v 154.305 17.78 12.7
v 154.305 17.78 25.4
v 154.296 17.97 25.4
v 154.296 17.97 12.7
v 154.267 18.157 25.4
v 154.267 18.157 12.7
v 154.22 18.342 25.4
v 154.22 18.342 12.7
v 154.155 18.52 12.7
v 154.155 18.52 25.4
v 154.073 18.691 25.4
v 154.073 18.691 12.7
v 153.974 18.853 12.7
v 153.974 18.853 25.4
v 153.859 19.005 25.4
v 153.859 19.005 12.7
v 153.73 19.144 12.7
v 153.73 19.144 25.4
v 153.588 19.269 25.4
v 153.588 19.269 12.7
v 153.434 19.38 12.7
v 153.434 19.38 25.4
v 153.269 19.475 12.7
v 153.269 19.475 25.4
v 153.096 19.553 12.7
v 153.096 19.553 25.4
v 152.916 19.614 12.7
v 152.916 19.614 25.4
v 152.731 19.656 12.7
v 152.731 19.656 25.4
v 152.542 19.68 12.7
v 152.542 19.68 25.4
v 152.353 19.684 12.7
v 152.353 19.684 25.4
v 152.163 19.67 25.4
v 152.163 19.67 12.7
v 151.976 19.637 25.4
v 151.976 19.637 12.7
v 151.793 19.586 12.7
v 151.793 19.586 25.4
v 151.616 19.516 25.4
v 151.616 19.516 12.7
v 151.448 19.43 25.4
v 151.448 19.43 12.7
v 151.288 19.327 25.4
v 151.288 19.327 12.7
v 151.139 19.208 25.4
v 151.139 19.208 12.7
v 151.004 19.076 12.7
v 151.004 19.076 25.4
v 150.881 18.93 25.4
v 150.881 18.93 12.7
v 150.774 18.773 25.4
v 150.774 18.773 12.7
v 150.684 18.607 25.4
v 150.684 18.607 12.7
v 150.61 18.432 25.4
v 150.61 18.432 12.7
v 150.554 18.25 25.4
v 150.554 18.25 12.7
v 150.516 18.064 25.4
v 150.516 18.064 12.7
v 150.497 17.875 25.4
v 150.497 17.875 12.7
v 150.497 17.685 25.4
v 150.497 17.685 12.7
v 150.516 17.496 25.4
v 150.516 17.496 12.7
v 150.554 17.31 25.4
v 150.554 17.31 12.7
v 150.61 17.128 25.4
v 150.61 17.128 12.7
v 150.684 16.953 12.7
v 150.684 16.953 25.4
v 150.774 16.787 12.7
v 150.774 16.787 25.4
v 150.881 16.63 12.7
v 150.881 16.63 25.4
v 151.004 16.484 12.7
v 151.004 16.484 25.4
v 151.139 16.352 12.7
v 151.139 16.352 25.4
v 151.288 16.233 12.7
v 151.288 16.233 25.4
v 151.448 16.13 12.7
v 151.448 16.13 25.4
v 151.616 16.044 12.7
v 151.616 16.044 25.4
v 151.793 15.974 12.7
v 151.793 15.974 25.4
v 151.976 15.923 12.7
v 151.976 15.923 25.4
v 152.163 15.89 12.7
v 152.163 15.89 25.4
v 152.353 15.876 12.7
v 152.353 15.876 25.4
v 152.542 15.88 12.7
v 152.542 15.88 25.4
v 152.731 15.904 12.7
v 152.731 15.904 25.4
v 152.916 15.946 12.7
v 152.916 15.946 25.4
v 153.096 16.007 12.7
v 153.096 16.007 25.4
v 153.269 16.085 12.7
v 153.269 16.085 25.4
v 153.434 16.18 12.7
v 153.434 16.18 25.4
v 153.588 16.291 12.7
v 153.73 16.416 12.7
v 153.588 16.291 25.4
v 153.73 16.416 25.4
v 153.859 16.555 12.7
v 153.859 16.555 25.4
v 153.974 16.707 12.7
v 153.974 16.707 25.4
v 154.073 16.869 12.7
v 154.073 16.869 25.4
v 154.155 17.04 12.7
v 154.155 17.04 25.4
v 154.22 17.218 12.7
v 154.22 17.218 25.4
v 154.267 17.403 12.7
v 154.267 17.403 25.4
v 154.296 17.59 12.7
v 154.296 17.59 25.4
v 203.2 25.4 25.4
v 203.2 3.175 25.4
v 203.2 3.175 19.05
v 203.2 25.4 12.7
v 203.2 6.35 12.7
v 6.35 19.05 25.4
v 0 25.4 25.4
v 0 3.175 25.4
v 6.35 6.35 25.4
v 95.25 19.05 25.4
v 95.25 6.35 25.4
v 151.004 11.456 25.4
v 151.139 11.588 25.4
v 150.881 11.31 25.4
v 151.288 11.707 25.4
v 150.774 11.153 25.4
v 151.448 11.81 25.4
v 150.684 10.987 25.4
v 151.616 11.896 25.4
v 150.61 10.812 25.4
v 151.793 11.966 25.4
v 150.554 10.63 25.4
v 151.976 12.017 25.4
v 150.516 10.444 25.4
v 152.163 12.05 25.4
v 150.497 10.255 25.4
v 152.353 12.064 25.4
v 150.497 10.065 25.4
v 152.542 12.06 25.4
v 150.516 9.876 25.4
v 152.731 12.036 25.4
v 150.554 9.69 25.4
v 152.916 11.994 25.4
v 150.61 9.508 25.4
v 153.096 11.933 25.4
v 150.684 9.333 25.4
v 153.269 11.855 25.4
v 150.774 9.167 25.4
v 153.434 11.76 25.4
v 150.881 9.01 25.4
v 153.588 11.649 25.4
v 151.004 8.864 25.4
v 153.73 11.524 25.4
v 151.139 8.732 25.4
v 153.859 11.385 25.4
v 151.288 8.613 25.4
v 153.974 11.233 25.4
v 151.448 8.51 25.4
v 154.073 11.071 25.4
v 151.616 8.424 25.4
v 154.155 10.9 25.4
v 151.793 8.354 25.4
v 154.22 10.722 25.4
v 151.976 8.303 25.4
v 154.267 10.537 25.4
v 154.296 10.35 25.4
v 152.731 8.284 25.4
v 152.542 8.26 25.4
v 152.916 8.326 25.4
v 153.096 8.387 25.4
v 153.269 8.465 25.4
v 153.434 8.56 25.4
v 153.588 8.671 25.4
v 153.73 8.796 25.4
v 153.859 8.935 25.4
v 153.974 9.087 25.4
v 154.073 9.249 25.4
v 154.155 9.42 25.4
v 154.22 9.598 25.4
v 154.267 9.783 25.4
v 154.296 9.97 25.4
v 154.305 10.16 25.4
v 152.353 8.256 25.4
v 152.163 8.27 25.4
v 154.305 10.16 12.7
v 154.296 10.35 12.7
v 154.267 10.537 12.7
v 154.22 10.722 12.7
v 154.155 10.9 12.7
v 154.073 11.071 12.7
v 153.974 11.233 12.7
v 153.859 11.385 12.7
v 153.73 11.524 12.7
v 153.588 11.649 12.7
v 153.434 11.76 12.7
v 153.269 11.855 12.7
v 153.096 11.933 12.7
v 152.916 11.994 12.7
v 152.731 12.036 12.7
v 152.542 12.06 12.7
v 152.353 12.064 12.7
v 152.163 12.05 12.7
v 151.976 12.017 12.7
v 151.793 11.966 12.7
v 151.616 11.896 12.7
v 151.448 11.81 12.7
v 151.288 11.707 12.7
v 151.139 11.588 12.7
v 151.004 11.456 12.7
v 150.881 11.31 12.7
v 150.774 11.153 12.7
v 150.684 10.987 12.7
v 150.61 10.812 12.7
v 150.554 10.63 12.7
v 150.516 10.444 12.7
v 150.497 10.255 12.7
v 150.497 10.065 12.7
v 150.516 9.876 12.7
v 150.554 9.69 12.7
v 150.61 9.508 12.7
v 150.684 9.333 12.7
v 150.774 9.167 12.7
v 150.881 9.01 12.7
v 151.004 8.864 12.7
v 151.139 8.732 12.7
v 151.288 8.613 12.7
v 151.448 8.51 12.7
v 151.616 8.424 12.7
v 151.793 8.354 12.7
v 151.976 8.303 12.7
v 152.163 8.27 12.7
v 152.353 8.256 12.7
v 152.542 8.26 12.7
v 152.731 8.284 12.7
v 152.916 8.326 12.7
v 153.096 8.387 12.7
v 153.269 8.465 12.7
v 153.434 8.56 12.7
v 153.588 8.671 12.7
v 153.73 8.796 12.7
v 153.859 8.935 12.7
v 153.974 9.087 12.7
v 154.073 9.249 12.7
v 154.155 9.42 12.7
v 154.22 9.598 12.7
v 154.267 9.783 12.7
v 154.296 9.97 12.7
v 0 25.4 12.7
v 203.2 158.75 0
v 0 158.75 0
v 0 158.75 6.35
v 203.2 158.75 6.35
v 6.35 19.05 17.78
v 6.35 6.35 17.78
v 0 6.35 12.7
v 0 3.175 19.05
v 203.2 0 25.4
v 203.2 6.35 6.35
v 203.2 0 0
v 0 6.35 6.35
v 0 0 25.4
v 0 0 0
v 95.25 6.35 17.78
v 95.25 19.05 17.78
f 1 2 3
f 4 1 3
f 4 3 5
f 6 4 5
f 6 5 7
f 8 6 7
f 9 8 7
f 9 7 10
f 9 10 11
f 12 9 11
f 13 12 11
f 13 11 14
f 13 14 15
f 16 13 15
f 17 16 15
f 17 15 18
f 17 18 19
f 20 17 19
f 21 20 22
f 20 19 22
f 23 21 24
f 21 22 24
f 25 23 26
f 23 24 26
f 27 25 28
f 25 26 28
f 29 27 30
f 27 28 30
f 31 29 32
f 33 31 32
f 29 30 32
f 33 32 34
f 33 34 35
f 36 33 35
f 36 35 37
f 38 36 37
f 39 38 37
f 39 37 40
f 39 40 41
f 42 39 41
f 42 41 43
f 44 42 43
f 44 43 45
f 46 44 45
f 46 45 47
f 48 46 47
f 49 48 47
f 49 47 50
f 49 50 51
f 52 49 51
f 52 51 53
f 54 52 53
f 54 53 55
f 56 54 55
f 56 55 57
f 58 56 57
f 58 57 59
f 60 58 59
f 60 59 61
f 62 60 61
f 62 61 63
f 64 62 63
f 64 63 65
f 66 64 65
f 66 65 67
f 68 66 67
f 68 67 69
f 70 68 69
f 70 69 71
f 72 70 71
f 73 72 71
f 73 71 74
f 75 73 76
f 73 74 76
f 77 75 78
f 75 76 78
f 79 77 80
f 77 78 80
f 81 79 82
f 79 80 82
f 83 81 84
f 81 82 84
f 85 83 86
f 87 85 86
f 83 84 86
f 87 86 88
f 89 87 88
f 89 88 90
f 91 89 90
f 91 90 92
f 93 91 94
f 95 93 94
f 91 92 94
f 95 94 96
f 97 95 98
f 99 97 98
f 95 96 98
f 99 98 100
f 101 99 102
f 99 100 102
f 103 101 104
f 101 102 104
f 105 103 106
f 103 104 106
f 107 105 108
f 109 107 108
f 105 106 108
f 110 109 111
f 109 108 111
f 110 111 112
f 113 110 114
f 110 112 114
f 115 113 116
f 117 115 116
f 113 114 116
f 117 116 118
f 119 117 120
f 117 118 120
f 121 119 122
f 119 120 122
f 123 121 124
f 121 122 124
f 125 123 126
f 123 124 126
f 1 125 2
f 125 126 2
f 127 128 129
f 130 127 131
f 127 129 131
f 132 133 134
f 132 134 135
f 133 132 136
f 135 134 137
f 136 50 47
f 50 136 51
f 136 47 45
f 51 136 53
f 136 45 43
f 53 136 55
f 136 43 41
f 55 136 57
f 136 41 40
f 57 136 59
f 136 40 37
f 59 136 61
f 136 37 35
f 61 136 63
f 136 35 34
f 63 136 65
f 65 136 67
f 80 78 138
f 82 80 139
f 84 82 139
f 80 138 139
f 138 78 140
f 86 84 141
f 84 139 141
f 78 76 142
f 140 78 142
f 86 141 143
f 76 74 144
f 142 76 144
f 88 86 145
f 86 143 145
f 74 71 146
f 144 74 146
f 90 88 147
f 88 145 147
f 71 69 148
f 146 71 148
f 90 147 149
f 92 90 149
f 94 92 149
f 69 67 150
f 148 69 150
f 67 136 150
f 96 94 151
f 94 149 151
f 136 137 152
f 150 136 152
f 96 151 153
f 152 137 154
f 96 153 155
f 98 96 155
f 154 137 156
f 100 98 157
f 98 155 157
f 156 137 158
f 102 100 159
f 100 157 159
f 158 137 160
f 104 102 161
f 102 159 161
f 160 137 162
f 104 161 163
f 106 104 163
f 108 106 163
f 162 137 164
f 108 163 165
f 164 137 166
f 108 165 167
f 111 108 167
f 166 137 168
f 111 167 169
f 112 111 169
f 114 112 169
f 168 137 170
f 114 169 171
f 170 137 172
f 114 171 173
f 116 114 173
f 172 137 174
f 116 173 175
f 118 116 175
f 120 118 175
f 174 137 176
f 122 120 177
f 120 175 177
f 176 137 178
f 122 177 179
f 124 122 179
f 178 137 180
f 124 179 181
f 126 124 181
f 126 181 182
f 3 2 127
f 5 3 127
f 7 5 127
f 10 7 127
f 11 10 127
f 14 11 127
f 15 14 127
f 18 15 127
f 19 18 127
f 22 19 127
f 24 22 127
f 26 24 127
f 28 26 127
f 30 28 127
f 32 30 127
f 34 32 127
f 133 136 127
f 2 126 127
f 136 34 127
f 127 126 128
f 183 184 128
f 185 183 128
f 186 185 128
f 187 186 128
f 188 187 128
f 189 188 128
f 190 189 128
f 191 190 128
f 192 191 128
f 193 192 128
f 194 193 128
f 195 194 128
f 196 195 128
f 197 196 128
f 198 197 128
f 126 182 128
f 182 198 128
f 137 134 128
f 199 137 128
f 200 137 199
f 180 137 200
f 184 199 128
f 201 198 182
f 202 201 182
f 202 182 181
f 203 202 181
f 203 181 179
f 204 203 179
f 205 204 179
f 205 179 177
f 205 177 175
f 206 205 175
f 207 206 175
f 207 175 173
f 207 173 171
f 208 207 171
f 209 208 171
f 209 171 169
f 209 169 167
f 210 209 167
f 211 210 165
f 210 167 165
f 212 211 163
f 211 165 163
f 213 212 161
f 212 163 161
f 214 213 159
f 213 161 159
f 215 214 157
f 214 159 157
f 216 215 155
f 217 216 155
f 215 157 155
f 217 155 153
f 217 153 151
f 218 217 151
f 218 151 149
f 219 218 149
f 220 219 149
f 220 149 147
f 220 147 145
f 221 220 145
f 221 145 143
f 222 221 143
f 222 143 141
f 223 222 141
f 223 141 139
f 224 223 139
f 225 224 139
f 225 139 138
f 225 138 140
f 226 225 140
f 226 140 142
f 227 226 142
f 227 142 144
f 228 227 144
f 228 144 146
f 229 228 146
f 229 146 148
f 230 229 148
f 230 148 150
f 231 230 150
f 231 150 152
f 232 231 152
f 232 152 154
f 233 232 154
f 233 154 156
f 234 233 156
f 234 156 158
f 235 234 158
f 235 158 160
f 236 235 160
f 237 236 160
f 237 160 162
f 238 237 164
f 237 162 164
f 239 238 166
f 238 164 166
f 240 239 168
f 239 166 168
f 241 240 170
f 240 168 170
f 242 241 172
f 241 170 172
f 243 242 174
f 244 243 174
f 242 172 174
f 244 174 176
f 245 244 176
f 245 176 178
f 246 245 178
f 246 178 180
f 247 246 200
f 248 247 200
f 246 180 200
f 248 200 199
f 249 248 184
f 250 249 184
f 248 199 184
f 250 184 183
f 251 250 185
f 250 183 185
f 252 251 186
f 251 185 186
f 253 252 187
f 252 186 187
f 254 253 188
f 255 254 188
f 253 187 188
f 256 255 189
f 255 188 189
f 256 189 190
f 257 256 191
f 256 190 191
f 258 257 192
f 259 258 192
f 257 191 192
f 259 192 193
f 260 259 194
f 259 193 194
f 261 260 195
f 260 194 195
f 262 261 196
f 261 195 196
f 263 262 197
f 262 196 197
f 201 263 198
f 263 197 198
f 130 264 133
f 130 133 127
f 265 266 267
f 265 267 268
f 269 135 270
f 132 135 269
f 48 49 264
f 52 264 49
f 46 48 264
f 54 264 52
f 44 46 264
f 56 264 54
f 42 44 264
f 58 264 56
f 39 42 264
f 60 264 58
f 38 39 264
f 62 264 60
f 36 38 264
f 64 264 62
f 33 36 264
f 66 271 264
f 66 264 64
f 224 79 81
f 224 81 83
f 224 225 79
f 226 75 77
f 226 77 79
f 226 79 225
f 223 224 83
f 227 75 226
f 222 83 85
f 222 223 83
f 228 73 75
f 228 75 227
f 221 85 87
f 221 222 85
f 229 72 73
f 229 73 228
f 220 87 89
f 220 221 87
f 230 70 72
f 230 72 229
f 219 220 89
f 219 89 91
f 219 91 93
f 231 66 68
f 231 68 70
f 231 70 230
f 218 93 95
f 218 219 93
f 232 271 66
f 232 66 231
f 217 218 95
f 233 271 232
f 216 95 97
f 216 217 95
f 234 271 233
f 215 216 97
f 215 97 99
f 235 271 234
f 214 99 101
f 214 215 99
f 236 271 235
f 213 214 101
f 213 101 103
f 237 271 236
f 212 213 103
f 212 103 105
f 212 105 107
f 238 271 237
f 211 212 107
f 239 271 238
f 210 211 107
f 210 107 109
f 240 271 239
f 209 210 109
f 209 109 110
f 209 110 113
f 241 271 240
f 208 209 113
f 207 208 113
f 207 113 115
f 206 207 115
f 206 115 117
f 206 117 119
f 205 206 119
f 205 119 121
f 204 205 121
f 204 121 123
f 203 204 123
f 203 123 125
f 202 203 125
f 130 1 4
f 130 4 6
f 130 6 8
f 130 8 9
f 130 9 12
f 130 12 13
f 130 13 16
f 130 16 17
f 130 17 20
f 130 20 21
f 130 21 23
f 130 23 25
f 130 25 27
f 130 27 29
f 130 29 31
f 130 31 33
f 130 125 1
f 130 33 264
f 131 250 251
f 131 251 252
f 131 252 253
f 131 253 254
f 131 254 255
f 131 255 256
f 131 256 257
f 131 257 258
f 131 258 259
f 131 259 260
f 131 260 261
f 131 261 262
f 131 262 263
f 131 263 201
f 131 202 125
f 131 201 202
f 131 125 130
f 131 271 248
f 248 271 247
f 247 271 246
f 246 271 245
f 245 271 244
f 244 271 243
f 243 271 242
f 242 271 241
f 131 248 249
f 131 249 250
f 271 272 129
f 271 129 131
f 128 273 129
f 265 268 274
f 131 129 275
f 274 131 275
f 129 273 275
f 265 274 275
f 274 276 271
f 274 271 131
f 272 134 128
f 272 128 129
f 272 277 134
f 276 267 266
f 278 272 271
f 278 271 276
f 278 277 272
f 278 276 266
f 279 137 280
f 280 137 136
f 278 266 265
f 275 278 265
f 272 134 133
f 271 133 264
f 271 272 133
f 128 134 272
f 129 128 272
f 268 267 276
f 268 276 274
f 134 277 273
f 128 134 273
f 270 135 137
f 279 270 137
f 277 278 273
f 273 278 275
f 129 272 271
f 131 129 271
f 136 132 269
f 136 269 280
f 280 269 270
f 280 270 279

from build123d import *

# Parameters (mm, degrees)
SKETCH1_W              = 203.2
SKETCH1_H              = 158.75
BOSS_EXTRUDE1_DEPTH    = 6.35
SKETCH2_W              = 203.2
SKETCH2_H              = 6.35
BOSS_EXTRUDE2_DEPTH    = 19.05
SKETCH3_W              = 203.2
SKETCH3_H              = 12.7
BOSS_EXTRUDE3_DEPTH    = 19.05
SKETCH4_W              = 88.9
SKETCH4_H              = 12.7
CUT_EXTRUDE1_DEPTH     = 7.62
CUT_EXTRUDE2_REACH     = 261.108
SKETCH5_R              = 1.905
SPLIT1_SURFACE_1_BACK  = 260.108
SPLIT1_SURFACE_1_DEPTH = 520.216
SPLIT1_SURFACE_2_BACK  = 260.108
SPLIT1_SURFACE_2_DEPTH = 520.216


with BuildPart() as part:
    # Sketch1 → Boss-Extrude1 (new body)
    with BuildSketch(Plane.XY):
        with Locations((101.6, 79.375)):
            Rectangle(SKETCH1_W, SKETCH1_H)
    extrude(amount=BOSS_EXTRUDE1_DEPTH)

    # Sketch2 → Boss-Extrude2 (add)
    with BuildSketch(Plane.XY.offset(6.35)):
        with Locations((101.6, 3.175)):
            Rectangle(SKETCH2_W, SKETCH2_H)
    extrude(amount=BOSS_EXTRUDE2_DEPTH)

    # Sketch3 → Boss-Extrude3 (add)
    with BuildSketch(Plane(origin=(0, 6.35, 0), x_dir=(1, 0, 0), z_dir=(0, 1, 0))):
        with Locations((101.6, -19.05)):
            Rectangle(SKETCH3_W, SKETCH3_H)
    extrude(amount=BOSS_EXTRUDE3_DEPTH)

    # Sketch4 → Cut-Extrude1 (cut)
    with BuildSketch(Plane.XY.offset(25.4)):
        with Locations((50.8, 12.7)):
            Rectangle(SKETCH4_W, SKETCH4_H)
    extrude(amount=-CUT_EXTRUDE1_DEPTH, mode=Mode.SUBTRACT)

    # Sketch5 → Cut-Extrude2 (cut, up to next)
    with BuildSketch(Plane.XY.offset(25.4), mode=Mode.PRIVATE) as cut_extrude2_sk1:
        with Locations((152.4, 17.78)):
            Circle(SKETCH5_R)
    cut_extrude2_tool1 = extrude(cut_extrude2_sk1.sketch, amount=-CUT_EXTRUDE2_REACH, mode=Mode.PRIVATE) & part.part
    # Sketch5 → Cut-Extrude2 (cut, up to next)
    with BuildSketch(Plane.XY.offset(25.4), mode=Mode.PRIVATE) as cut_extrude2_sk2:
        with Locations((152.4, 10.16)):
            Circle(SKETCH5_R)
    cut_extrude2_tool2 = extrude(cut_extrude2_sk2.sketch, amount=-CUT_EXTRUDE2_REACH, mode=Mode.PRIVATE) & part.part
    add(cut_extrude2_tool1.solids().sort_by_distance((152.4, 17.78, 25.4))[0], mode=Mode.SUBTRACT)
    add(cut_extrude2_tool2.solids().sort_by_distance((152.4, 10.16, 25.4))[0], mode=Mode.SUBTRACT)


with BuildPart() as body_2:
    # Split1: the piece behind the surface
    add(part.part)
    # Split1 surface: a surface, the sketch's curves swept straight by 520.216 mm
    with BuildLine(Plane(origin=(203.2, 0, 0), x_dir=(0, 0, -1), z_dir=(1, 0, 0)).offset(-SPLIT1_SURFACE_1_BACK), mode=Mode.PRIVATE) as split1_surface_1_path:
        Line((-25.4, 3.175), (-19.05, 3.175))
        Line((-19.05, 3.175), (-12.7, 6.35))
    split1_surface_1 = Shell.extrude(split1_surface_1_path.wire(), (1 * SPLIT1_SURFACE_1_DEPTH, 0 * SPLIT1_SURFACE_1_DEPTH, 0 * SPLIT1_SURFACE_1_DEPTH))
    split(bisect_by=split1_surface_1, keep=Keep.BOTTOM)


with BuildPart() as part_1:
    add(part.part)

    # Split1: split by a surface, the side it looks to stays
    # Split1 surface: a surface, the sketch's curves swept straight by 520.216 mm
    with BuildLine(Plane(origin=(203.2, 0, 0), x_dir=(0, 0, -1), z_dir=(1, 0, 0)).offset(-SPLIT1_SURFACE_2_BACK), mode=Mode.PRIVATE) as split1_surface_2_path:
        Line((-25.4, 3.175), (-19.05, 3.175))
        Line((-19.05, 3.175), (-12.7, 6.35))
    split1_surface_2 = Shell.extrude(split1_surface_2_path.wire(), (1 * SPLIT1_SURFACE_2_DEPTH, 0 * SPLIT1_SURFACE_2_DEPTH, 0 * SPLIT1_SURFACE_2_DEPTH))
    split(bisect_by=split1_surface_2, keep=Keep.TOP)


solid = Compound([body_2.part, part_1.part])
